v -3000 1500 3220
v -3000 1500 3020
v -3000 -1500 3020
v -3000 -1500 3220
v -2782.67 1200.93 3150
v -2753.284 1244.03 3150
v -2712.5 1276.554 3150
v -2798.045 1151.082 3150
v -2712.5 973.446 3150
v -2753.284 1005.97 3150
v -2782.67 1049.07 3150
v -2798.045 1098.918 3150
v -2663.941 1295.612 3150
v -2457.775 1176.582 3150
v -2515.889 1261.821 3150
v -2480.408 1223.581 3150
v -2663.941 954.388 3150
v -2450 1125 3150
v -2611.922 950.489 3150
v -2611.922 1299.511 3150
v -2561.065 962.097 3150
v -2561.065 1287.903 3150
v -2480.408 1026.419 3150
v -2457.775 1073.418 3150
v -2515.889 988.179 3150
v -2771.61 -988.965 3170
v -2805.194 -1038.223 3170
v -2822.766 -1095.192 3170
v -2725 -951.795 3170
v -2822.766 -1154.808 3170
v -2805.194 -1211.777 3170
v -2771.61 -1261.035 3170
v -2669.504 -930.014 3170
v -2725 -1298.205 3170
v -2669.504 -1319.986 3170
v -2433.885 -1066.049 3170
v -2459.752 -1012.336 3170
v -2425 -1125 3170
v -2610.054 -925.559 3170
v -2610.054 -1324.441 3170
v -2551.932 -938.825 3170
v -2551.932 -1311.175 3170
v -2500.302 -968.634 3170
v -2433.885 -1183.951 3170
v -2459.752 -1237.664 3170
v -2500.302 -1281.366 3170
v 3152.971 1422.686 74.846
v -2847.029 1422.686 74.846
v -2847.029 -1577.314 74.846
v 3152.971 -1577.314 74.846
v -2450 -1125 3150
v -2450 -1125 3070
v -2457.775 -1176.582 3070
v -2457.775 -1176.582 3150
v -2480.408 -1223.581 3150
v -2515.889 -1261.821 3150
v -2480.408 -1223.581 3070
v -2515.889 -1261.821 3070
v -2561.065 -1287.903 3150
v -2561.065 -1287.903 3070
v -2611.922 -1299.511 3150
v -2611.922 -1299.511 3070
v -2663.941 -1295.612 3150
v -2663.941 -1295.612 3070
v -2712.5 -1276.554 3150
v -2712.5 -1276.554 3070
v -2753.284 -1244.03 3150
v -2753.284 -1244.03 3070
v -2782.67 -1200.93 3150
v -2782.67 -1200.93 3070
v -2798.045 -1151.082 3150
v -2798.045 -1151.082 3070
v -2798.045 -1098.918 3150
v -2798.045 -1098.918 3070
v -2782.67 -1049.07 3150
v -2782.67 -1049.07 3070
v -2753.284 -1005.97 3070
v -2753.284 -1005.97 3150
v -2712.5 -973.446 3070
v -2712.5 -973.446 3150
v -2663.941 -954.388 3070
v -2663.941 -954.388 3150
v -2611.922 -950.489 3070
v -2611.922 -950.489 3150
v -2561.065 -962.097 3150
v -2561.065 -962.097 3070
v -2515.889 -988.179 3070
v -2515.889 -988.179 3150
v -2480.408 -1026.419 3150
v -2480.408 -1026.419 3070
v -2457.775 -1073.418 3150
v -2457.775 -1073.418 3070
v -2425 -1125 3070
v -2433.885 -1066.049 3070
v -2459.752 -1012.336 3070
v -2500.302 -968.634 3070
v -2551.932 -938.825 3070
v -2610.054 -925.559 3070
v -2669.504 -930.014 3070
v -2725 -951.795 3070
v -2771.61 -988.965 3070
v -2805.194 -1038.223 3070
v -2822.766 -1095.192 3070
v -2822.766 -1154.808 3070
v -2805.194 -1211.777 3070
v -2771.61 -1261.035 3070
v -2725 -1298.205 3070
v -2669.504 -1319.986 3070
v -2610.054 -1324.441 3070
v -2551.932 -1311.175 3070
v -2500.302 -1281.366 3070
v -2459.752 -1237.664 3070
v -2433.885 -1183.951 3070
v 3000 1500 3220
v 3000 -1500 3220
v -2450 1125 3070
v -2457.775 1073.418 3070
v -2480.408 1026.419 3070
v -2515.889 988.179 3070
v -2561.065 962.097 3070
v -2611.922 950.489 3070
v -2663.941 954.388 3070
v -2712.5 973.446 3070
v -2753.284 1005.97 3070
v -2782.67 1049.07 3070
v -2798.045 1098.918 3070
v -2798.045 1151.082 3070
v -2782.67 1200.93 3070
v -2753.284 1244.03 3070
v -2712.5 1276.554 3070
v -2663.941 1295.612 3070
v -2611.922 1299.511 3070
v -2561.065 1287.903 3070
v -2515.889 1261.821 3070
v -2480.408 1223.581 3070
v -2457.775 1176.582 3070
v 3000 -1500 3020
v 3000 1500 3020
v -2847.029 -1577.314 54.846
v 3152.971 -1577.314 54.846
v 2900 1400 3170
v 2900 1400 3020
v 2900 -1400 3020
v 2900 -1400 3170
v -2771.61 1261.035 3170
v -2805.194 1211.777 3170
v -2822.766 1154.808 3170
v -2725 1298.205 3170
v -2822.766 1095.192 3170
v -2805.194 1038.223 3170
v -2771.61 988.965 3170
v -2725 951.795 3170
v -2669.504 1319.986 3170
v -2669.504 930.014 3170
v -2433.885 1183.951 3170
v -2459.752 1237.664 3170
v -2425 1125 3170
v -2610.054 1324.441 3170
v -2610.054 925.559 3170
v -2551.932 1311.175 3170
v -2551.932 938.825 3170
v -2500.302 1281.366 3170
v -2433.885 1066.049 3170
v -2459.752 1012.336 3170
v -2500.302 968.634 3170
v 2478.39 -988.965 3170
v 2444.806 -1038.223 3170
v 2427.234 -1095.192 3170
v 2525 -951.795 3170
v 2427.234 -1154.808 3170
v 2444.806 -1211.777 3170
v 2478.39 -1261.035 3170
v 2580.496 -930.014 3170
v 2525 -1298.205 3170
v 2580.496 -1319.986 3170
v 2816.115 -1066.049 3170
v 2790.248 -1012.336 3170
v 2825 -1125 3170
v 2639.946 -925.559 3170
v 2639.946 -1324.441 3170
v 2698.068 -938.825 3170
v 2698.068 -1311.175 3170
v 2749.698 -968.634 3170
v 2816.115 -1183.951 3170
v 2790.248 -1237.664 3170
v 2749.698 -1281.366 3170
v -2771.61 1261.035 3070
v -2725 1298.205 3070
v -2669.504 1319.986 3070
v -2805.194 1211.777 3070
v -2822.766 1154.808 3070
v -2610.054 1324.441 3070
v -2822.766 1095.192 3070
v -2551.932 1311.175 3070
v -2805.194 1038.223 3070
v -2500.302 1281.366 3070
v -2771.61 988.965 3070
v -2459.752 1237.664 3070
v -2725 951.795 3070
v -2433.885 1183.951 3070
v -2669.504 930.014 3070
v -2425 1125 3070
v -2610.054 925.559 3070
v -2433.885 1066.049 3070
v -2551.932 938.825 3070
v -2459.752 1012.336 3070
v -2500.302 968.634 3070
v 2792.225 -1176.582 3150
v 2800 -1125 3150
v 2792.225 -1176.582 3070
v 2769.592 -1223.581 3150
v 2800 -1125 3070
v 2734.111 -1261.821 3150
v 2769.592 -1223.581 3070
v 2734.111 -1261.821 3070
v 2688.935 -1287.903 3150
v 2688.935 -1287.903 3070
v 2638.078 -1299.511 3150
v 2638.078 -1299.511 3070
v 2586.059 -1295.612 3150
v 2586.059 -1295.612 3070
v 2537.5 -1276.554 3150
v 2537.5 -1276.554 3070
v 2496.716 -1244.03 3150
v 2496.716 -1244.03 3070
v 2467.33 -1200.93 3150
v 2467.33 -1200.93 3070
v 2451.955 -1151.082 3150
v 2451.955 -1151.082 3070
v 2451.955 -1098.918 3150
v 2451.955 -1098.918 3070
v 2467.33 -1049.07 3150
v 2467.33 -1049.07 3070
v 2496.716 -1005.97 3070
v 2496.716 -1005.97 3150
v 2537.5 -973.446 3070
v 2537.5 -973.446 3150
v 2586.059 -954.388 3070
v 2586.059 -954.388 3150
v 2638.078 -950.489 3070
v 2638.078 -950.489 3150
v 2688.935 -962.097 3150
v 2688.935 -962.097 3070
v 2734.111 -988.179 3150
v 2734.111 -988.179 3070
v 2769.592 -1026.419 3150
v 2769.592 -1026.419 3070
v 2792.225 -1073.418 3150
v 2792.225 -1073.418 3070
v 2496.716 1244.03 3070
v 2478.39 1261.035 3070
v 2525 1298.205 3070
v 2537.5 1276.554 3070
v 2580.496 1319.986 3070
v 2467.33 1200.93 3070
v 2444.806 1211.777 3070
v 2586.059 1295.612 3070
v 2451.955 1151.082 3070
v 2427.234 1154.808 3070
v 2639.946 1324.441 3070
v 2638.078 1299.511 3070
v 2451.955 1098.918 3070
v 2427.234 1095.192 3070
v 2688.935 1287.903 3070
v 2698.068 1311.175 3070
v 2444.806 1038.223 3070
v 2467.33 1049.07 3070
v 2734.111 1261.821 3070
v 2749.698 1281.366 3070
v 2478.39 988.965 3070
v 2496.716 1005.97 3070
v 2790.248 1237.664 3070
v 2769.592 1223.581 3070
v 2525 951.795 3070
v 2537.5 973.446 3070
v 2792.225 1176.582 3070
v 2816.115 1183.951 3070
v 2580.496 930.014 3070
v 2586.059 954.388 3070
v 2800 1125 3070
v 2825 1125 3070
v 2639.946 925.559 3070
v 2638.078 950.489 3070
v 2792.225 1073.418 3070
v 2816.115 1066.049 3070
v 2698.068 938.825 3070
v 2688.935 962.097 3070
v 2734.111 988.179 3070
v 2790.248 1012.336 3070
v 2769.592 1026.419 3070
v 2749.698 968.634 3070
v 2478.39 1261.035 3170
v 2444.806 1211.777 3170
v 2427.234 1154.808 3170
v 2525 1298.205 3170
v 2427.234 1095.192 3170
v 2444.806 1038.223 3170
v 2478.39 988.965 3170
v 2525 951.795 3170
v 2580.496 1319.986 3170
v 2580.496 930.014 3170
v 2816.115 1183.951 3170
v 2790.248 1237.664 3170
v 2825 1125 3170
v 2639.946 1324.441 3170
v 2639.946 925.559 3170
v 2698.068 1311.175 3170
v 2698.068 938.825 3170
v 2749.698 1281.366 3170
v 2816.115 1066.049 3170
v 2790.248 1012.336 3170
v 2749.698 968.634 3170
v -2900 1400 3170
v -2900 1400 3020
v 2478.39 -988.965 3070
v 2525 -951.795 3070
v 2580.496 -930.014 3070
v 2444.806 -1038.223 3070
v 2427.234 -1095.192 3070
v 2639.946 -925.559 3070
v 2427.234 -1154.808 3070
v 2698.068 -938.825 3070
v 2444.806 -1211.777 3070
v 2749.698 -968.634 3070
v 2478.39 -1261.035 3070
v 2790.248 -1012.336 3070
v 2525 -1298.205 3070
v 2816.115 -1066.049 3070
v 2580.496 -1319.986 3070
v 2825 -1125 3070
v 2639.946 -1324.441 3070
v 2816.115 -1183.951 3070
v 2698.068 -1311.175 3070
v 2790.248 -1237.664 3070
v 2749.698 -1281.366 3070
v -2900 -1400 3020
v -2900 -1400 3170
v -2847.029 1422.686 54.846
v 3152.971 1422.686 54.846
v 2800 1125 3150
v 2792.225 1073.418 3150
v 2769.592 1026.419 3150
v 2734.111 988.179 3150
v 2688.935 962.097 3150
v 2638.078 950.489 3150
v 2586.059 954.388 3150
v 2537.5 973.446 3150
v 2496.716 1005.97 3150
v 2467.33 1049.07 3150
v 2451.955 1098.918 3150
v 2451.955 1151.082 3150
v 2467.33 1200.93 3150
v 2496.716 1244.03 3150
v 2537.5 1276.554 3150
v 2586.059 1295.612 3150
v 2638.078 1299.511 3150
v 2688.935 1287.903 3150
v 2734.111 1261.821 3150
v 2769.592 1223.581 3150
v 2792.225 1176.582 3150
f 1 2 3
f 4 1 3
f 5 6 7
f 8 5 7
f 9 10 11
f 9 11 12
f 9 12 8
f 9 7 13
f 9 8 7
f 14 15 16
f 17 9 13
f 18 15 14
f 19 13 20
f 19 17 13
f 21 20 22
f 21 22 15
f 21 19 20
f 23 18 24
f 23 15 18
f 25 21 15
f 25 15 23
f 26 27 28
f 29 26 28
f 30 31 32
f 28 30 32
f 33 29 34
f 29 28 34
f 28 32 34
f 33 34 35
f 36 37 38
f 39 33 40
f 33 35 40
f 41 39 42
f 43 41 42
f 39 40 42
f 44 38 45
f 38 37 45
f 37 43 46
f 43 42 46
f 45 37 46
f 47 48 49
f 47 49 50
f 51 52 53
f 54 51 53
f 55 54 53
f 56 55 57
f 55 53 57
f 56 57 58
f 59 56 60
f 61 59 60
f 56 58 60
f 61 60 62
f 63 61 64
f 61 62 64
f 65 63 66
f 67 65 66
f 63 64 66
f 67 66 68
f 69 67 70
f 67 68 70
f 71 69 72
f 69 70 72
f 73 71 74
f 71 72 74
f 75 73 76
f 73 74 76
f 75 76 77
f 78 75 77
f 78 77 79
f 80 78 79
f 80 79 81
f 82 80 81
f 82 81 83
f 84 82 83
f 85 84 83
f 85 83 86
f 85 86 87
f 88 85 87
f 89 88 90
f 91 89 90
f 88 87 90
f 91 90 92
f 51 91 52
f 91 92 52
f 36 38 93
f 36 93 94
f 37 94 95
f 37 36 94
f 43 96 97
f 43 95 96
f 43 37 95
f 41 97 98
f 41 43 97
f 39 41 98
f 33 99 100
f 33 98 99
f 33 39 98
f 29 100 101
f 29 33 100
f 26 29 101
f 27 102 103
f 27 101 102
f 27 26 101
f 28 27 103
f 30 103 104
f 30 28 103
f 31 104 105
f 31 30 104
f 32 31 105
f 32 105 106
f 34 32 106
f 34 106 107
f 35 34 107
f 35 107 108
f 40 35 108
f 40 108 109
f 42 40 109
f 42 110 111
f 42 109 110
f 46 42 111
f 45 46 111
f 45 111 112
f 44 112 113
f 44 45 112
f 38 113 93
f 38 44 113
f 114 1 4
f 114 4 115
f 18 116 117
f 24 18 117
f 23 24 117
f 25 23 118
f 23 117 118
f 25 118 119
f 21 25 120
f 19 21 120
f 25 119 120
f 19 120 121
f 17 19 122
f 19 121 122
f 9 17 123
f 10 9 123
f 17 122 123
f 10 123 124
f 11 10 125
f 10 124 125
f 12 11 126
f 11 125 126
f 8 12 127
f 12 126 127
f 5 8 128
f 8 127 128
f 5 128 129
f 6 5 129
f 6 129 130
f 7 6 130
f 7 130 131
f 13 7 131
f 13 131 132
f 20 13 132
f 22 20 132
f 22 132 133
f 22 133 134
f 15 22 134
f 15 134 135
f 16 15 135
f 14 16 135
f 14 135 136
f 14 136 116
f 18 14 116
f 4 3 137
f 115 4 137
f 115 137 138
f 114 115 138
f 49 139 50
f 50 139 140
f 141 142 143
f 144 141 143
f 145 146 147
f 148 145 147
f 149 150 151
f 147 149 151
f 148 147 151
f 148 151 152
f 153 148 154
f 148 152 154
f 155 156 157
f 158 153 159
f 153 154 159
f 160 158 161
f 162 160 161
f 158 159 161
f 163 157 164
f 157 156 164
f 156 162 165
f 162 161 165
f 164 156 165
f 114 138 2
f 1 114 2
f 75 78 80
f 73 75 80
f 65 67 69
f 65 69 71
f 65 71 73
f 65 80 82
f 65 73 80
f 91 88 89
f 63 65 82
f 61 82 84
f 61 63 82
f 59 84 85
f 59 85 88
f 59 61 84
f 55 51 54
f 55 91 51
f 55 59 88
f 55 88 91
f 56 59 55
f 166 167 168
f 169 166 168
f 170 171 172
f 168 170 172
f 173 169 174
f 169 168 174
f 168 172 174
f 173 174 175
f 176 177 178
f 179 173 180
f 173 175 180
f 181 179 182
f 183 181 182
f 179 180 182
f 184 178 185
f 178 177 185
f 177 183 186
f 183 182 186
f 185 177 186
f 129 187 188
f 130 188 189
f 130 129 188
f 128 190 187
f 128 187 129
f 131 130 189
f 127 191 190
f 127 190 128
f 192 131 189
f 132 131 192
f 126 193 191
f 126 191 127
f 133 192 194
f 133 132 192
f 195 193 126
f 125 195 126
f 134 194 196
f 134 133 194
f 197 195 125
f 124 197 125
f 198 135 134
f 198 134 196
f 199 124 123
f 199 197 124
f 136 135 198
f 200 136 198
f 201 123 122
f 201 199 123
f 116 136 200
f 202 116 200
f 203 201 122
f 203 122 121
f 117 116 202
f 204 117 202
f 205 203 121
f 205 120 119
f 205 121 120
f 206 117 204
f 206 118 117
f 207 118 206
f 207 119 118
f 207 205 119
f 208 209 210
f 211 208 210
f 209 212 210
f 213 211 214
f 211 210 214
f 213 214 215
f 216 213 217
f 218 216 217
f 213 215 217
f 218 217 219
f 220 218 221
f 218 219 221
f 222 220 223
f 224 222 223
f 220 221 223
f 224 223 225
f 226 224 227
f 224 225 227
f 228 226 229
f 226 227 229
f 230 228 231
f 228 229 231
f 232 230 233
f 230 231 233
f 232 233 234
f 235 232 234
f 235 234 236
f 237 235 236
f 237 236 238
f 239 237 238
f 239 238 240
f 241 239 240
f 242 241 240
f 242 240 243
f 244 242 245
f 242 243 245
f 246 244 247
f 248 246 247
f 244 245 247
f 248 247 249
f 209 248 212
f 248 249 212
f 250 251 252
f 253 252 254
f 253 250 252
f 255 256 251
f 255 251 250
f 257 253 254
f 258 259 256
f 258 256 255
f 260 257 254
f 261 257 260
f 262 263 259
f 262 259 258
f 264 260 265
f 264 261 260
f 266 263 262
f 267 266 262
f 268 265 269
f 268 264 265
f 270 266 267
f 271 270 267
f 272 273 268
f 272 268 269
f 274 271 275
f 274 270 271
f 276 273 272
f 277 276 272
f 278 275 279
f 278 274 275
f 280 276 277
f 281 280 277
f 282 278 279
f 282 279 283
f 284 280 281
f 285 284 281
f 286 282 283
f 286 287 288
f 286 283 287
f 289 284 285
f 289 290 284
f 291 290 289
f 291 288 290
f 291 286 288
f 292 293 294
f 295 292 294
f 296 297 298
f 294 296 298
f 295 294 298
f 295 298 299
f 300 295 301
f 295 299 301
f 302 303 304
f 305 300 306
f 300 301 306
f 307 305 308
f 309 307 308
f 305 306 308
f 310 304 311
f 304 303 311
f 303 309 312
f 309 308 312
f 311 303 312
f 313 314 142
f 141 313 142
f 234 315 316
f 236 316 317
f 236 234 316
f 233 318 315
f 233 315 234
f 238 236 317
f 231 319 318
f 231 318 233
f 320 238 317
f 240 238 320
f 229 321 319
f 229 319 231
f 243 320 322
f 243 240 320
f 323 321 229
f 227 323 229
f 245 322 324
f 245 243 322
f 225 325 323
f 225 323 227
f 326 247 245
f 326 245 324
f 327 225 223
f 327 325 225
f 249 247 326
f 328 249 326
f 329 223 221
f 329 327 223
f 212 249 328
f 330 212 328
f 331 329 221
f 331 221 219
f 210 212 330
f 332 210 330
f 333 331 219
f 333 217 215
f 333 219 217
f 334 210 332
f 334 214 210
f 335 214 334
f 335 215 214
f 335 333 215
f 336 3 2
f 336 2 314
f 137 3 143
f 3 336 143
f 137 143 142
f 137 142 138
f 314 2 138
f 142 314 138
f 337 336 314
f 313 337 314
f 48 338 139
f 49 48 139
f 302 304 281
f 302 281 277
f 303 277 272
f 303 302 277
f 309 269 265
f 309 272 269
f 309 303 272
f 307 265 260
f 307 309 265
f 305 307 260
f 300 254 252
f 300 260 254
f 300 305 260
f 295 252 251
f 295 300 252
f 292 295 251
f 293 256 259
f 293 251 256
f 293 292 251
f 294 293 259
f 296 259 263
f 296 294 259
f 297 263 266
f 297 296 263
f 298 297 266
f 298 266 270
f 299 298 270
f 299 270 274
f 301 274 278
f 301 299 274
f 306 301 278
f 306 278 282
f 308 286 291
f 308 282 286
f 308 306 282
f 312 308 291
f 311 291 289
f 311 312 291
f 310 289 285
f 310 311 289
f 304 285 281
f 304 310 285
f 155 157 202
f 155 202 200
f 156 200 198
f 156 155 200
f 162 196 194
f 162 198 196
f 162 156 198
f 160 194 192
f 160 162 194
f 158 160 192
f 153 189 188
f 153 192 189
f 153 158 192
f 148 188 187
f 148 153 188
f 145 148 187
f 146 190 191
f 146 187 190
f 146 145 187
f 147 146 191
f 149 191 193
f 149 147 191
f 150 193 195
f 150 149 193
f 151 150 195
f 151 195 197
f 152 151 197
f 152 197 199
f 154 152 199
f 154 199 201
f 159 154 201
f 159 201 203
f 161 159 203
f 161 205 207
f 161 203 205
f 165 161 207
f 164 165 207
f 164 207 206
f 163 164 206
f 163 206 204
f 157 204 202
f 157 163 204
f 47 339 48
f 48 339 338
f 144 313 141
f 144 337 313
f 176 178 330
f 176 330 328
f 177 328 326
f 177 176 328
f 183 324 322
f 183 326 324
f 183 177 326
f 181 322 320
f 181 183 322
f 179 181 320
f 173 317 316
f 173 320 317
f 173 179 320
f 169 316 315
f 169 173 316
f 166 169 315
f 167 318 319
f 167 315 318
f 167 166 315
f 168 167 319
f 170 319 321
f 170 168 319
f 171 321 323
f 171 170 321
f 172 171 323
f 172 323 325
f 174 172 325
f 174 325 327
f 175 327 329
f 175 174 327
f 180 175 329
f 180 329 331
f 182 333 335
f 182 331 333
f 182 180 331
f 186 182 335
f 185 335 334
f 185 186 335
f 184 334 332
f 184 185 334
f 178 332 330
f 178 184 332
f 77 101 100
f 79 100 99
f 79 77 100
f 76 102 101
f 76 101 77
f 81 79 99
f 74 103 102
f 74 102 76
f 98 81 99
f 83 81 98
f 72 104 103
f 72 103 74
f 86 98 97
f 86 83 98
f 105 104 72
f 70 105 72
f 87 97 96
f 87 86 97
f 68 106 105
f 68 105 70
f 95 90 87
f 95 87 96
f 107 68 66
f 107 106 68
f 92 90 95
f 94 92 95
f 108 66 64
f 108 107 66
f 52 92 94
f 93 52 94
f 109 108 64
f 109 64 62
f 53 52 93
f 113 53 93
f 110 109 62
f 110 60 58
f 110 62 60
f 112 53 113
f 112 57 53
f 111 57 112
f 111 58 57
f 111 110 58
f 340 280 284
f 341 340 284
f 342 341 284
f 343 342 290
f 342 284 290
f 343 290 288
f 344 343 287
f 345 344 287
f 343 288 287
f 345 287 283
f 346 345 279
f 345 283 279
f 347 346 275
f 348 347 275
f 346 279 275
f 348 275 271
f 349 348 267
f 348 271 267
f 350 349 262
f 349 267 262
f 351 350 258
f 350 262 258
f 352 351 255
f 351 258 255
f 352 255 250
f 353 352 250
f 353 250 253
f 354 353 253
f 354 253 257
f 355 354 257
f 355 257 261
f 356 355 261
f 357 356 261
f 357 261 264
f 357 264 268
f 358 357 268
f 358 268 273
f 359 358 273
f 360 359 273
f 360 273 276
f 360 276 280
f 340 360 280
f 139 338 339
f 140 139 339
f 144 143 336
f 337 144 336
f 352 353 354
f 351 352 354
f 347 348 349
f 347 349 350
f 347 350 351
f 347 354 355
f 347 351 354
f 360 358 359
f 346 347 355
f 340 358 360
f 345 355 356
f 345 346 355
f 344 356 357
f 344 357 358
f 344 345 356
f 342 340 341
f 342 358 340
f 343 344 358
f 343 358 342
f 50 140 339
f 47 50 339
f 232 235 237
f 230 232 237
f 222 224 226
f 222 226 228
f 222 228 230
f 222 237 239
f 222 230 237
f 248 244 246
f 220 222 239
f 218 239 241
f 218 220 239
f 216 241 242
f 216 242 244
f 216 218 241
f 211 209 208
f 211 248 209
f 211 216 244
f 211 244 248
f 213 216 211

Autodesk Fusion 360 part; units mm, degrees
sketch "Sketch1" plane through (0, 0, 0) normal (0, 0, 1) x (1, 0, 0) in component "Desk"
  line L0 (3000, 1500) -> (-3000, 1500)
  line L1 (-3000, 1500) -> (-3000, -1500)
  line L2 (-3000, -1500) -> (3000, -1500)
  line L3 (3000, -1500) -> (3000, 1500)
  line L4 (3000, 1500) -> (-3000, -1500) construction
  line L5 (-3000, 1500) -> (3000, -1500) construction
  dimension "d1" = 6000
  dimension "d2" = 3000
extrude "Extrude1" add sketch "Sketch1" along normal blind 20 makes body 1 in component "Desk"
ref_plane "WorkPlane1" through (0, 0, 3020) normal (0, 0, 1) x (1, 0, 0) in component "False Ceiling"
sketch "Sketch1 (2)" plane through (0, 0, 3020) normal (0, 0, 1) x (1, 0, 0) in component "False Ceiling"
  line L0 (3000, 1500) -> (-3000, 1500)
  line L1 (-3000, 1500) -> (-3000, -1500)
  line L2 (-3000, -1500) -> (3000, -1500)
  line L3 (3000, -1500) -> (3000, 1500)
  line L4 (3000, 1500) -> (-3000, -1500) construction
  line L5 (-3000, 1500) -> (3000, -1500) construction
  dimension "d12" = 6000
  dimension "d13" = 3000
extrude "Extrude1'" add sketch "Sketch1 (2)" along normal blind 200 separate body makes body 2 in component "False Ceiling"
sketch "Sketch1 (3)" plane through (0, 0, 3020) normal (0, 0, -1) x (1, 0, 0)
  line L0 (3000, -1500) -> (3000, 1500)
  line L1 (3000, 1500) -> (-3000, 1500)
  line L2 (-3000, 1500) -> (-3000, -1500)
  line L3 (-3000, -1500) -> (3000, -1500)
  line L4 (2900, 1400) -> (-2900, 1400)
  line L5 (-2900, 1400) -> (-2900, -1400)
  line L6 (-2900, -1400) -> (2900, -1400)
  line L7 (2900, -1400) -> (2900, 1400)
  line L8 (2900, 1400) -> (-2900, -1400) construction
  line L9 (-2900, 1400) -> (2900, -1400) construction
extrude "Extrude2" cut sketch "Sketch1 (3)" against normal blind 150 contours L4 L5 L6 L7 bodies 2 in component "False Ceiling"
sketch "Sketch1 (4)" plane through (0, 0, 3170) normal (0, 0, -1) x (1, 0, 0) in component "lights"
  line L0 (2900, -1400) -> (2900, 1400)
  line L1 (2900, 1400) -> (-2900, 1400)
  line L2 (-2900, 1400) -> (-2900, -1400)
  line L3 (-2900, -1400) -> (2900, -1400)
  circle A0 centre (-2625, 1125) radius 200
  circle A1 centre (-2625, -1125) radius 200
  circle A2 centre (2625, 1125) radius 200
  circle A3 centre (2625, -1125) radius 200
  dimension "d20" = -2250
  dimension "d21" = -5250
extrude "Extrude1''" add sketch "Sketch1 (4)" along normal blind 100 separate body contours A0 | A1 | A2 | A3 makes body 3 at (-2425.9938, 1144.9136, 3136.6667) makes body 4 at (2824.0062, -1105.0864, 3136.6667) makes body 5 at (-2425.9938, -1105.0864, 3136.6667) makes body 6 at (2824.0062, 1144.9136, 3136.6667) in component "lights"
sketch "Sketch2" plane through (0, 0, 3070) normal (0, 0, -1) x (1, 0, 0) in component "lights"
  circle A0 centre (2625, 1125) radius 200
  circle A1 centre (2625, 1125) radius 175
  circle A2 centre (2625, -1125) radius 175
  circle A3 centre (-2625, -1125) radius 175
  circle A4 centre (-2625, 1125) radius 175
extrude "Extrude2'" cut sketch "Sketch2" against normal blind 80 contours A1 | A2 | A3 | A4 bodies 3 4 5 6 in component "lights"
component "Desk" placed x (1, 0, 0) y (0, 1, 0) z (0, 0, 1) at (152.9708, -77.3137, 54.8464)
component "False Ceiling" placed x (1, 0, 0) y (0, 1, 0) z (0, 0, 1) at (0, 0, 0)
component "lights" placed x (1, 0, 0) y (0, 1, 0) z (0, 0, 1) at (0, 0, 0)
